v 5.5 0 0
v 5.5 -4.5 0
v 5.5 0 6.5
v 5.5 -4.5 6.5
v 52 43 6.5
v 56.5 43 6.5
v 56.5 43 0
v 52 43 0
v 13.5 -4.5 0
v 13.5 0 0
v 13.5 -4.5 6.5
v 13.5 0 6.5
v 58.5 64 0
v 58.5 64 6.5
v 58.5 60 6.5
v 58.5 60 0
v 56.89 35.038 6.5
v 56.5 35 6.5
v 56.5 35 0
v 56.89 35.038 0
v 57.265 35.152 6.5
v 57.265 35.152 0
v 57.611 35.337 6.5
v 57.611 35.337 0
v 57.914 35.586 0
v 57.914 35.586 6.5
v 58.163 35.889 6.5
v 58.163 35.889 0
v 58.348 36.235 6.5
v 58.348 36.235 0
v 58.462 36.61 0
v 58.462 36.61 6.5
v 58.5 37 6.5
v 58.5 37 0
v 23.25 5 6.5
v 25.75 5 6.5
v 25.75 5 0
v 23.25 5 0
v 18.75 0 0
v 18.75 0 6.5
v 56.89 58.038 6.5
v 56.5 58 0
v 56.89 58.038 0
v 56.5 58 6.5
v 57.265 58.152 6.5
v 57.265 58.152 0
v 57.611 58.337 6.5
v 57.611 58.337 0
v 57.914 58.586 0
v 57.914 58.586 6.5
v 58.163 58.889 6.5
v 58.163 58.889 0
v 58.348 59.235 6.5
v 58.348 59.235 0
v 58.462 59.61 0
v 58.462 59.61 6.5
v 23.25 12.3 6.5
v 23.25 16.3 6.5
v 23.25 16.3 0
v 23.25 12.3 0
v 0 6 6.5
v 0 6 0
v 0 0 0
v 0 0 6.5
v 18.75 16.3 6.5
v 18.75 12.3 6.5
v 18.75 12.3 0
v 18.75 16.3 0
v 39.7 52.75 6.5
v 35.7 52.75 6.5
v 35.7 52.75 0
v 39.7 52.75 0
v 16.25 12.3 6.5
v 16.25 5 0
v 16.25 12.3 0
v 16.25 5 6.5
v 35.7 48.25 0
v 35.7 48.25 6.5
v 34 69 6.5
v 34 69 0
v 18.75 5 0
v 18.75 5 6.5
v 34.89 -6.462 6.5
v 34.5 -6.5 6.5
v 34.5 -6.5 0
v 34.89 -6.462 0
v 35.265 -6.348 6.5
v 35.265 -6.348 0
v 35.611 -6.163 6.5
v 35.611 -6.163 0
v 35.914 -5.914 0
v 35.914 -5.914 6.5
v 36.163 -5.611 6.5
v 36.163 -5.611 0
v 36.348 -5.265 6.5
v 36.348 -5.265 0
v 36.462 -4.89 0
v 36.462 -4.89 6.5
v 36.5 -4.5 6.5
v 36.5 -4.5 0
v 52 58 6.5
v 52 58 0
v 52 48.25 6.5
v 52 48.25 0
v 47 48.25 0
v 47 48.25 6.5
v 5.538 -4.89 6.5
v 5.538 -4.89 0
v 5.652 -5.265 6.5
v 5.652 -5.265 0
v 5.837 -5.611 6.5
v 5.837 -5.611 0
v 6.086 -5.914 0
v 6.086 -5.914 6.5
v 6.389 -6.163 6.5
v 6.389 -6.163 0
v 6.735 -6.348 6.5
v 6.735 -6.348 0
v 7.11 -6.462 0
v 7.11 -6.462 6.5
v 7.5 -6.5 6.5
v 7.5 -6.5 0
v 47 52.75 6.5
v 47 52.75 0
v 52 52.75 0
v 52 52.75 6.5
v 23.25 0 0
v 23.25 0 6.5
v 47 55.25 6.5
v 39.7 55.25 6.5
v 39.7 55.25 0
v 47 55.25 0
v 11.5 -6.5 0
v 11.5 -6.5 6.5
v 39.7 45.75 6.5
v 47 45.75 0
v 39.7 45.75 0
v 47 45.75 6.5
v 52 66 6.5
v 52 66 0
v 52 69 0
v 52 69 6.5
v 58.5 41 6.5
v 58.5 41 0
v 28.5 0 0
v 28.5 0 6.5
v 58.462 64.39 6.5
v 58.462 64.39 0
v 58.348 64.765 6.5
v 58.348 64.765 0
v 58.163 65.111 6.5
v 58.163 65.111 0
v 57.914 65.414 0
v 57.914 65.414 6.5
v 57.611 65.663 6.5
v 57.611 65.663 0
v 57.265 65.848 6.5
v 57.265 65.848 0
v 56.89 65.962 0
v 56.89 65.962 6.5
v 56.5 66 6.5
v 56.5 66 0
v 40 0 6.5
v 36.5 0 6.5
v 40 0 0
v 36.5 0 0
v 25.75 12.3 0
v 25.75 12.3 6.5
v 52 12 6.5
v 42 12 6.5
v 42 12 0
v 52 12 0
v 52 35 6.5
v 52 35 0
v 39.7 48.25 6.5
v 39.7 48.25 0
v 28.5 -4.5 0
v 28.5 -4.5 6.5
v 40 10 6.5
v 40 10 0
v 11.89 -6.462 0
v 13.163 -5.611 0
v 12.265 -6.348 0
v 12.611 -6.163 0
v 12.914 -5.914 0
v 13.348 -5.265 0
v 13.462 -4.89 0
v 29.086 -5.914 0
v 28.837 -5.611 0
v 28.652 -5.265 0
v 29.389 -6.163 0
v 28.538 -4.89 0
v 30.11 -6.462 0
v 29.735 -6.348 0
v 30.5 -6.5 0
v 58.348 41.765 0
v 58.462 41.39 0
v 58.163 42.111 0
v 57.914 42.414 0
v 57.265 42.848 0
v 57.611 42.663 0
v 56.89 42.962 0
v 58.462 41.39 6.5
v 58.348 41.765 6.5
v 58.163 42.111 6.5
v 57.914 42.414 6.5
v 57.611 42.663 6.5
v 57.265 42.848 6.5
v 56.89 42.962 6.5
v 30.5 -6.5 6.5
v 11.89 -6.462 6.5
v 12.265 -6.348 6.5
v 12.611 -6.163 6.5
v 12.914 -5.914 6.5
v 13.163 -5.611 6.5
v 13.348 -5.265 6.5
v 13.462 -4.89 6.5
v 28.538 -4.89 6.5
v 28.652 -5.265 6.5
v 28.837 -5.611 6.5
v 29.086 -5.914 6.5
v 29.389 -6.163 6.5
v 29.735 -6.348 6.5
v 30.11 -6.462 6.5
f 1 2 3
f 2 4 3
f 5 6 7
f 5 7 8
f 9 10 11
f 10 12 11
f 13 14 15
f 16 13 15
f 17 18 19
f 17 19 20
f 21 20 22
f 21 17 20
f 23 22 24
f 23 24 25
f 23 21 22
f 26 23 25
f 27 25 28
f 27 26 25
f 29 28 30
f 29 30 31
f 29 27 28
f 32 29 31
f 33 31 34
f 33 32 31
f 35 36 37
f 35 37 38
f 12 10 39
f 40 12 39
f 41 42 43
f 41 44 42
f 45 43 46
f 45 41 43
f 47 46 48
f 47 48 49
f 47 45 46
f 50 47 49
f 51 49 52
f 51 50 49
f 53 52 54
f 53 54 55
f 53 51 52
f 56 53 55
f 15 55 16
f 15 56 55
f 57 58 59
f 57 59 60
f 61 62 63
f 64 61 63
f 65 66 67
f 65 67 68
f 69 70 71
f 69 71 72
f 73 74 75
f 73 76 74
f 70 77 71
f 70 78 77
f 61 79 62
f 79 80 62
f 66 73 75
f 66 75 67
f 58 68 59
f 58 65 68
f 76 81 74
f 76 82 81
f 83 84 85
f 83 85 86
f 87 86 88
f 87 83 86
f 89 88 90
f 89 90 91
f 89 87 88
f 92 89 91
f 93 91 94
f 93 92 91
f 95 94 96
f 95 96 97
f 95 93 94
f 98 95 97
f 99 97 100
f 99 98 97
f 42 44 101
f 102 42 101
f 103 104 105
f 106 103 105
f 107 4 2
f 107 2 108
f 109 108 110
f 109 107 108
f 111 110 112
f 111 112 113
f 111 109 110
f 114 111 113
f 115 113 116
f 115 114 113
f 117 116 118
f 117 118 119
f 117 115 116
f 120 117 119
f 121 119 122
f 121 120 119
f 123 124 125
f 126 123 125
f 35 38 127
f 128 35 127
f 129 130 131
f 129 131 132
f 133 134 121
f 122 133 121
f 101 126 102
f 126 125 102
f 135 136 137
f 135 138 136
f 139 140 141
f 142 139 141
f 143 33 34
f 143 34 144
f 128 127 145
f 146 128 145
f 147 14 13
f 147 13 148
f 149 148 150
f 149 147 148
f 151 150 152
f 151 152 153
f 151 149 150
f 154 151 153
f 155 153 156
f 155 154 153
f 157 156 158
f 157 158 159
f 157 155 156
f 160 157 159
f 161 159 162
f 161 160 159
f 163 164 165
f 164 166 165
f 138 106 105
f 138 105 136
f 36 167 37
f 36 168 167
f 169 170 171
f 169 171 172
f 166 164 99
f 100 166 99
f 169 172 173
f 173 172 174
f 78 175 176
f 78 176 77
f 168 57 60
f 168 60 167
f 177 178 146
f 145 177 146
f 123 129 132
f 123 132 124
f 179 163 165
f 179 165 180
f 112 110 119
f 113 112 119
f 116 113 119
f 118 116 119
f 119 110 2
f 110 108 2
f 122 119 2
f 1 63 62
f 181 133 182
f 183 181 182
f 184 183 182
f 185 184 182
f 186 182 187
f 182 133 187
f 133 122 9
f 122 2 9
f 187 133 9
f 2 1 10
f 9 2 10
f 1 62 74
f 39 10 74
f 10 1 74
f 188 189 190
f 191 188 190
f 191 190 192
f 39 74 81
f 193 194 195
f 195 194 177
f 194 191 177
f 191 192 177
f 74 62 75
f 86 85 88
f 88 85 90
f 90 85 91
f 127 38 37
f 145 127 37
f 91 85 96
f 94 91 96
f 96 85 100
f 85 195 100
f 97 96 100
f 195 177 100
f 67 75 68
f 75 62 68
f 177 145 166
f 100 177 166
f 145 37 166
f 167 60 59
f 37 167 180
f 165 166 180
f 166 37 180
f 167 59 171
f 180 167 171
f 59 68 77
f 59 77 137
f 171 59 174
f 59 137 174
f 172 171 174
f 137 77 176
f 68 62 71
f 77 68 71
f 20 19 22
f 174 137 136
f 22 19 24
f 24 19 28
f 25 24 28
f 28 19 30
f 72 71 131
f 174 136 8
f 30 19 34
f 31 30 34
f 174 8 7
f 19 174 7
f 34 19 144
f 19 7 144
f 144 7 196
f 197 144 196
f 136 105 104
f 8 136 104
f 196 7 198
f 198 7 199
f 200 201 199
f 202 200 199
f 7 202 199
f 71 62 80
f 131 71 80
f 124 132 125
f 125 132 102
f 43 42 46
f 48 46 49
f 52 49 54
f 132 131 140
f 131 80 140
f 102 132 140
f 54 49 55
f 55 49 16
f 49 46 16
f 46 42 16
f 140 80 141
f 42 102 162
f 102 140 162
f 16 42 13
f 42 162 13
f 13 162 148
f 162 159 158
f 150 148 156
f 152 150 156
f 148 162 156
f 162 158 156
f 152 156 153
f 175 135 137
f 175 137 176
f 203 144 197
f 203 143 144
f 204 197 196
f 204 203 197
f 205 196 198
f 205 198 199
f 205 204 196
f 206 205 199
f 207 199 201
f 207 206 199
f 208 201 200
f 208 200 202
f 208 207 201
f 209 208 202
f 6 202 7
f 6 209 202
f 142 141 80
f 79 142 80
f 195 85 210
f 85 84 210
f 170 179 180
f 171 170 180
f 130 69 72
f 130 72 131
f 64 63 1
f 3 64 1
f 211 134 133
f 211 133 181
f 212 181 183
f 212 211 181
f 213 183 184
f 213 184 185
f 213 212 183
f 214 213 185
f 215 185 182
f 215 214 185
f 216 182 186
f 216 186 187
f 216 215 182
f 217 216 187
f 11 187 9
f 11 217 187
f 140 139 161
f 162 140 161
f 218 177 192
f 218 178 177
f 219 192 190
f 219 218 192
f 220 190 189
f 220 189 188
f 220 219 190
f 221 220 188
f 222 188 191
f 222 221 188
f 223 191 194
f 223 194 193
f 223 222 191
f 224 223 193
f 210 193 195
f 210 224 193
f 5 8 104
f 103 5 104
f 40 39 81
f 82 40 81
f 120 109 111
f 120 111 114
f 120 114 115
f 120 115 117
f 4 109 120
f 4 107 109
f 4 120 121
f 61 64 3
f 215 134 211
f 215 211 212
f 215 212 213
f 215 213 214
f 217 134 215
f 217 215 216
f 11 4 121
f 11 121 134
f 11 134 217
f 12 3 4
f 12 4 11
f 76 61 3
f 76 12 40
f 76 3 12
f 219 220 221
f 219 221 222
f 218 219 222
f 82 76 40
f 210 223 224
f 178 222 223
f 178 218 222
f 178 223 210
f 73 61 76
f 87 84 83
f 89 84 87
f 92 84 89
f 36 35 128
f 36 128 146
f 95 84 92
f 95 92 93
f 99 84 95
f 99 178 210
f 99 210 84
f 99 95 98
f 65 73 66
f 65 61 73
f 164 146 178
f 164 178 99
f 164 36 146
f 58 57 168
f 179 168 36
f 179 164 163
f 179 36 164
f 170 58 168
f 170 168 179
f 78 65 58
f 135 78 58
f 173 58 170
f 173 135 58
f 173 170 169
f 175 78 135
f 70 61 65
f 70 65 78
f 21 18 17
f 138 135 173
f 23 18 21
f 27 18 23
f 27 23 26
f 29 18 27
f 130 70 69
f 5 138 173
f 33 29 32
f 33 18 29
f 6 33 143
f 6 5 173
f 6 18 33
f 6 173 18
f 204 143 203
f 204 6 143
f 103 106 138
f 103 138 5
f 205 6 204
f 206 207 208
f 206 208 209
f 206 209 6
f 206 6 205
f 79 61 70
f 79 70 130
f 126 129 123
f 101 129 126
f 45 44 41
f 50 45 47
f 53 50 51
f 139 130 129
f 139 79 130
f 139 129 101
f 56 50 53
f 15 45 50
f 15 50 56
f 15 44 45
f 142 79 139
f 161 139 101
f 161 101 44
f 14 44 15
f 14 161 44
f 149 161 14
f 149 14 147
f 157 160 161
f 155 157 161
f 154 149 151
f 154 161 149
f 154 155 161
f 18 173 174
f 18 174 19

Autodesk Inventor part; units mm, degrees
ref_plane "YZ Plane" through (0, 0, 0) normal (1, 0, 0) x (0, 1, 0)
ref_plane "XZ Plane" through (0, 0, 0) normal (0, 1, 0) x (-1, 0, 0)
ref_plane "XY Plane" through (0, 0, 0) normal (0, 0, 1) x (1, 0, 0)
sketch "Sketch1" plane through (0, 0, 0) normal (0, 0, 1) x (1, 0, 0)
  line L0 (0, 0) -> (52, 0)
  line L1 (52, 0) -> (52, 69)
  line L2 (52, 69) -> (34, 69)
  line L3 (34, 69) -> (0, 6)
  line L4 (0, 6) -> (0, 0)
  dimension "d0" = 52
  dimension "d1" = 6
  dimension "d2" = 18
  dimension "d3" = 69
extrude "Extrusion1" add sketch "Sketch1" along normal blind 6.5
sketch "Sketch2" plane through (0, 0, 6.5) normal (0, 0, 1) x (1, 0, 0)
  line L0 (0, 0) -> (52, 0) projected
  line L1 (52, 0) -> (52, 69) projected
  line L2 (18.75, 16.3) -> (23.25, 16.3)
  line L3 (23.25, 0) -> (18.75, 0)
  line L4 (25.75, 12.3) -> (25.75, 5)
  line L5 (16.25, 5) -> (16.25, 12.3)
  line L6 (39.7, 55.25) -> (47, 55.25)
  line L7 (47, 45.75) -> (39.7, 45.75)
  line L8 (52, 52.75) -> (52, 48.25)
  line L9 (35.7, 48.25) -> (35.7, 52.75)
  line L10 (16.25, 12.3) -> (18.75, 12.3)
  line L11 (23.25, 12.3) -> (25.75, 12.3)
  line L12 (18.75, 0) -> (18.75, 5)
  line L13 (18.75, 12.3) -> (18.75, 16.3)
  line L14 (25.75, 5) -> (23.25, 5)
  line L15 (18.75, 5) -> (16.25, 5)
  line L16 (23.25, 16.3) -> (23.25, 12.3)
  line L17 (23.25, 5) -> (23.25, 0)
  line L18 (52, 48.25) -> (47, 48.25)
  line L19 (39.7, 48.25) -> (35.7, 48.25)
  line L20 (35.7, 52.75) -> (39.7, 52.75)
  line L21 (47, 52.75) -> (52, 52.75)
  line L22 (39.7, 45.75) -> (39.7, 48.25)
  line L23 (39.7, 52.75) -> (39.7, 55.25)
  line L24 (47, 55.25) -> (47, 52.75)
  line L25 (47, 48.25) -> (47, 45.75)
  point P0 (35.7, 50.5)
  point P1 (21, 16.3)
  dimension "d6" = 4.5
  dimension "d7" = 2.5
  dimension "d8" = 2.5
  dimension "d9" = 5
  dimension "d10" = 4
  dimension "d11" = 7.3
  dimension "d12" = 4.5
  dimension "d13" = 2.5
  dimension "d14" = 2.5
  dimension "d15" = 4
  dimension "d16" = 5
  dimension "d17" = 7.3
  dimension "d19" = 31
  dimension "d39" = 18.5
extrude "Extrusion2" cut sketch "Sketch2" against normal blind 6.5
sketch "Sketch3" plane through (0, 0, 6.5) normal (0, 0, 1) x (1, 0, 0)
  line L0 (23.25, 0) -> (52, 0) projected
  line L1 (52, 0) -> (52, 48.25) projected
  line L2 (35.7, 48.25) -> (35.7, 52.75) projected
  line L3 (52, 52.75) -> (52, 69) projected
  line L4 (0, 0) -> (18.75, 0) projected
  line L5 (18.75, 16.3) -> (23.25, 16.3) projected
  line L6 (5.5, 0) -> (13.5, 0)
  line L7 (13.5, 0) -> (13.5, -4.5)
  line L8 (11.5, -6.5) -> (7.5, -6.5)
  line L9 (5.5, -4.5) -> (5.5, 0)
  line L10 (28.5, 0) -> (36.5, 0)
  line L11 (36.5, 0) -> (36.5, -4.5)
  line L12 (34.5, -6.5) -> (30.5, -6.5)
  line L13 (28.5, -4.5) -> (28.5, 0)
  line L14 (52, 35) -> (56.5, 35)
  line L15 (58.5, 37) -> (58.5, 41)
  line L16 (56.5, 43) -> (52, 43)
  line L17 (52, 43) -> (52, 35)
  line L18 (52, 66) -> (56.5, 66)
  line L19 (58.5, 64) -> (58.5, 60)
  line L20 (56.5, 58) -> (52, 58)
  line L21 (52, 58) -> (52, 66)
  arc A0 (5.5, -4.5) -> (7.5, -6.5) centre (7.5, -4.5) ccw
  arc A1 (11.5, -6.5) -> (13.5, -4.5) centre (11.5, -4.5) ccw
  arc A2 (28.5, -4.5) -> (30.5, -6.5) centre (30.5, -4.5) ccw
  arc A3 (34.5, -6.5) -> (36.5, -4.5) centre (34.5, -4.5) ccw
  arc A4 (56.5, 35) -> (58.5, 37) centre (56.5, 37) ccw
  arc A5 (58.5, 41) -> (56.5, 43) centre (56.5, 41) ccw
  arc A6 (58.5, 64) -> (56.5, 66) centre (56.5, 64) ccw
  arc A7 (56.5, 58) -> (58.5, 60) centre (56.5, 60) ccw
  point P0 (35.7, 50.5)
  point P1 (21, 16.3)
  dimension "d22" = 2
  dimension "d23" = 6.5
  dimension "d24" = 8
  dimension "d25" = 8
  dimension "d26" = 8
  dimension "d27" = 8
  dimension "d28" = 6.5
  dimension "d29" = 7.5
  dimension "d30" = 15
  dimension "d31" = 15
  dimension "d32" = 7.5
extrude "Extrusion3" add sketch "Sketch3" against normal blind 6.5
sketch "Sketch4" plane through (0, 0, 6.5) normal (0, 0, 1) x (1, 0, 0)
  line L0 (52, 0) -> (40, 0)
  line L1 (40, 0) -> (40, 12)
  line L2 (40, 12) -> (52, 12)
  line L3 (52, 12) -> (52, 0)
  dimension "d35" = 12
  dimension "d36" = 12
extrude "Extrusion4" cut sketch "Sketch4" against normal blind 6.5
chamfer "Chamfer1" distance 2 angle 45 1 edges at (40, 12, 3.25)
properties part number "x_motor_cable_mount_brace" material "Plywood, Finish"
